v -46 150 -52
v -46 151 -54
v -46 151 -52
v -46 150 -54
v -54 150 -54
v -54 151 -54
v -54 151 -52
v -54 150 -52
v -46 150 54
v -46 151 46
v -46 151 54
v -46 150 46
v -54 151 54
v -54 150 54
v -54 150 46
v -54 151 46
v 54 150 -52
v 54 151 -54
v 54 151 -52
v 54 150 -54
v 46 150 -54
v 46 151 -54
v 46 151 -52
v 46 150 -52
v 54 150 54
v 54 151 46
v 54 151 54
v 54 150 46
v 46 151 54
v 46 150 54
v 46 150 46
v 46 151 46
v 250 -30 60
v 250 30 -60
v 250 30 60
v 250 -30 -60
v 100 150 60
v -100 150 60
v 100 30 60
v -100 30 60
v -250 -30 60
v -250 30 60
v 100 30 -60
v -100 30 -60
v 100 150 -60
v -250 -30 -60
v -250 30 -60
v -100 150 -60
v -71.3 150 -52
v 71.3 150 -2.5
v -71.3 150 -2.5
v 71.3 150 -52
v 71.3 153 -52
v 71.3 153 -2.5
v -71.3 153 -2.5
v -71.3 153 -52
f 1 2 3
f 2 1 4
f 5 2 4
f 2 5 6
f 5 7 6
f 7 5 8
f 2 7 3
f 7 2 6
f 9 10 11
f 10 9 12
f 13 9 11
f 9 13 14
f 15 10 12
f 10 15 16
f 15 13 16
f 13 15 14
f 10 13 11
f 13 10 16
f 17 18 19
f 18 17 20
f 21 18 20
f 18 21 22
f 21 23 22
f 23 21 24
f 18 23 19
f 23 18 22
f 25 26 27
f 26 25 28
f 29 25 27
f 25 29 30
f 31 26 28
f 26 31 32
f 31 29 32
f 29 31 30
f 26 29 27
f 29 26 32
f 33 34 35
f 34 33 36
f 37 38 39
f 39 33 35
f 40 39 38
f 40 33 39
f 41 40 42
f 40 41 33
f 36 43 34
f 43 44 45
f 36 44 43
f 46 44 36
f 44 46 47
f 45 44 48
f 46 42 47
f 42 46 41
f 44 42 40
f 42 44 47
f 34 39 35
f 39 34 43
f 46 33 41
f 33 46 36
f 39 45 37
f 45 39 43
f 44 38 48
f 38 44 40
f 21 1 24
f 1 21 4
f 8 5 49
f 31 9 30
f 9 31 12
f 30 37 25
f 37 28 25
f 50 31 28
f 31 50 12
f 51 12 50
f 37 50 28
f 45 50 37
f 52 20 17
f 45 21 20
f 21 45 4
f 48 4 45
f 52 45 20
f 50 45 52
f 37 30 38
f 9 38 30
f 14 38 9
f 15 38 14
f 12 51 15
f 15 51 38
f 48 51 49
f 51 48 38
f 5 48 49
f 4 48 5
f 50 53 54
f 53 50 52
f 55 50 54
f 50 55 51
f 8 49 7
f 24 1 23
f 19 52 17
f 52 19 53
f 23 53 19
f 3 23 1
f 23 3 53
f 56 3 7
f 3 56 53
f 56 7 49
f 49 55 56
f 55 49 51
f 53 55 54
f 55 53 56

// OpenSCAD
// file: lume-config-bolt.scad
// LUME v2 — Bolt SKU configuration overrides.
//
// This file is INCLUDED INSTEAD OF lume-config.scad for the Bolt-bar build
// path. It defines every constant needed by lume-shell.scad / lume-pod.scad
// at Bolt-SKU values. To regenerate Bolt-bar STLs, set the OpenSCAD
// command-line `-D BOLT_SKU=true` and use lume-tform-bolt-assembly.scad as
// the entrypoint, OR pass per-variable `-D` overrides matching the values
// below.
//
// Rule: if a constant matters for the bar's external shape, the cradle, or
// the pod's K11 housing, override it here. Everything else (joinery, ribbing,
// LED, wordmark, render quality, feature toggles) inherits the v1 defaults
// from lume-config.scad which we're not redefining.
//
// ── 2026-04-27 caliper-verify checklist (when the Bolt arrives) ──
//   [ ] FEMTO_W              measured along the bar X-axis. Target 140 ±0.5.
//   [ ] FEMTO_D              measured along bar Y-axis (front-to-back). Target 39.
//   [ ] FEMTO_H              measured along bar Z-axis (top-to-bottom). Target 30.
//   [ ] FEMTO_MOUNT_PITCH_X  M3 mount-hole spacing along X. Currently 100, TBD.
//   [ ] FEMTO_MOUNT_PITCH_Z  M3 mount-hole spacing along Z. Currently 30, TBD.
//   [ ] USB-C port angle     side-exit vs rear-exit drives umbilical routing.
//   [ ] Tripod bushing       1/4-20 / M4 / nothing? affects optional cradle pin.
//   [ ] Mass with cable      drives torque rating on cradle clamp.
//   [ ] Lens recess depth    nudge CAM_RECESS_DEPTH if lens proud of pill window.
// After verification, re-export STLs:
//   openscad -D BOLT_SKU=true -o exports/sku1-bolt/<part>.stl <part>-source.scad
// then re-render hero shots via render_tform.py --variant bolt.

// ======== EXTERIOR (Bolt overrides) ========
LUME_WIDTH   = 500;     // UNCHANGED — same bar width as Mega SKU
LUME_HEIGHT  = 120;     // UNCHANGED — same bar height
LUME_DEPTH   = 60;      // ⭐ OVERRIDE: was 85. Bolt is 39mm deep, doesn't need 85
                        //   internal cavity becomes 60-6 = 54mm front-to-back
WALL         = 3.0;     // UNCHANGED
CORNER_R     = 8;       // UNCHANGED
INNER_R      = 5;       // UNCHANGED
CHAMFER      = 1.2;     // UNCHANGED

// ======== SPLIT PLANE ========
SPLIT_Y      = 0;       // UNCHANGED — centered split
SPLIT_X      = 80;      // UNCHANGED — keep seam-hide position from v1 fix
SPLIT_SHELL_X = true;
LIP_W        = 2.0;
LIP_H        = 3.0;
LIP_CLEAR    = 0.2;

// ======== COMPONENT FOOTPRINTS (Bolt camera) ========
JETSON_W = 110; JETSON_D = 110; JETSON_H = 72;   // legacy compat — unused in Bolt
JETSON_MOUNT_PITCH = 96;
FEMTO_W  = 140;         // ⭐ OVERRIDE: Bolt is 140mm wide along bar X-axis
FEMTO_D  = 39;          // ⭐ OVERRIDE: Bolt is 39mm deep
FEMTO_H  = 30;          // ⭐ OVERRIDE: Bolt is 30mm tall
FEMTO_MOUNT_PITCH_X = 100;  // ⚠ TBD — verify with caliper on Apr 27
FEMTO_MOUNT_PITCH_Z = 30;   // ⚠ TBD — verify with caliper on Apr 27

// ======== WORDMARK (Bolt SKU) ========
WORDMARK_TEXT  = "LUME";
WORDMARK_H     = 16;
WORDMARK_DEPTH = 1.5;
WORDMARK_Z     = 18;
MIRROR_WORDMARK = false;

// ======== LED diffuser (Bolt SKU — same) ========
LED_W = 460;
LED_H = 6;
LED_Z = -32;
LED_X = 0;
LED_DEPTH = 4;
LED_ID = 8;

// ======== Camera recesses ========
CAM_RECESS_DEPTH = 4;

// ======== End grilles ========
SHOW_END_GRILLES = false;
GRILLE_W = 60;
GRILLE_H = 30;
GRILLE_X_OFFSET = LUME_WIDTH/2 - GRILLE_W/2 - 22;

// ======== VESA on bar rear (Bolt SKU keeps as fallback) ========
VESA_PITCH = 100;
VESA_HOLE_D = 5.4;
VESA_PLATE_T = 4;

// ======== JOINERY ========
INSERT_OD = 4.5;
INSERT_DEPTH = 6;
INSERT_PITCH = 100;
COUNTERBORE_D = 6.0;
CORNER_BOLT_INSET = 14;

// ======== INTERNAL STRUCTURE ========
RIB_T = 2.0;
RIB_H = 8;
RIB_PITCH = 80;
CABLE_CHANNEL_W = 10;
CABLE_CHANNEL_H = 6;
BAFFLE_T = 2.5;
BAFFLE_X = -LUME_WIDTH/2 + 180;

// ======== T-FORM REAR POD (Bolt SKU — slimmer) ========
POD_ENABLED  = true;
// ⭐ VERIFIED K11 spec B0G12MD8RD (2026-04-26).
K11_W  = 131.83;     // was 142.6
K11_D  = 124.46;     // was 113 — drives POD_D bump
K11_H  =  57.91;     // was 49.5
K11_VESA_PITCH = 75;
K11_BOTTOM_FAN_INTAKE = true;
K11_TOP_FAN_EXHAUST   = true;
K11_BOTTOM_CLEAR_MIN  = 12;

POD_W        = 200;     // UNCHANGED
POD_H        = 130;     // ⭐ OVERRIDE: bar height + K11 fan-intake clearance
POD_D        = 165;     // ⭐ OVERRIDE — was 100 (and 130 in Mega config).
                        //   Verified K11_D = 124.5mm + 25 cable-bend + 10 airflow
                        //   rear gap = 159mm internal cavity needed → POD_D=165.
                        //   Bolt SKU has no Mega Jetson hump but still needs
                        //   space for the K11 itself — same constraint as Mega.
POD_X_OFF    = 0;
POD_WALL     = WALL;
POD_FILLET_R = 8;       // ⭐ OVERRIDE: was 12. Tighter visual line on slim bar.

POD_FLANGE_T   = 4;
POD_FLANGE_W   = 12;
POD_BOLT_INSET = 8;

POD_VESA_PITCH = 100;
POD_VESA_PLATE_T = VESA_PLATE_T;

POD_VENT_W = 40;
POD_VENT_H = 4;
POD_VENT_PITCH = 10;
POD_VENT_COUNT = 6;

POD_FEEDTHROUGH_W = 80;
POD_FEEDTHROUGH_H = 24;

// ======== RENDER QUALITY ========
$fa = 2;
$fs = 0.4;

// ======== FEATURE TOGGLES ========
SHOW_COMPONENTS = true;
SHOW_INTERNALS  = true;
EXPLODED        = false;
EXPLODE_DIST    = 60;
USE_JOINERY     = false;

USE_REAL_FEMTO = false;     // Bolt STEP not yet imported. Cube proxy for now.
USE_REAL_BOLT  = false;     // ⚠ flip to true once references/orbbec-femto-bolt.stl lands
// main file
// LUME T-form concept — bar + rear pod
// 2026-04-26 — proposal: separate compute pod behind the bar so the bar keeps
// its slim Sonos profile and the K11 + Mega + cables get a proper volume.
//
// Render: openscad -o lume-pod-concept.stl lume-pod-concept.scad
// Or load in OpenSCAD GUI for live preview.

include <lume-config-bolt.scad>;

// --- Pod parameters (all editable here) ---
POD_W       = 200;   // pod width along bar X-axis
POD_H       = LUME_HEIGHT;  // match bar height for a clean side silhouette
POD_D       = 120;   // pod depth along bar Y-axis (extension behind bar)
POD_X_OFF   = 0;     // 0 = centered, negative = shift left
POD_VESA_PITCH = 100;  // VESA 100×100 on back of pod

// Whether to fillet the pod-bar transition for visual continuity.
POD_FILLET  = true;
POD_FILLET_R = 12;

// --- Front bar (current LUME shell) ---
module front_bar() {
    // Use a simple cube proxy — real bar is the existing shell halves
    color("#222831", 0.9)
    translate([-LUME_WIDTH/2, -LUME_DEPTH/2, -LUME_HEIGHT/2])
        cube([LUME_WIDTH, LUME_DEPTH, LUME_HEIGHT]);
}

// --- Rear pod (new compute enclosure) ---
module rear_pod() {
    color("#1a2027", 0.95)
    translate([POD_X_OFF - POD_W/2, LUME_DEPTH/2, -POD_H/2])
        cube([POD_W, POD_D, POD_H]);
}

// Optional fillet between bar back face and pod front face — gives the
// transition a soft chamfer instead of a hard 90° step.
module fillet_strip() {
    if (POD_FILLET) {
        color("#3a4252", 0.85)
        translate([POD_X_OFF - POD_W/2, LUME_DEPTH/2 - POD_FILLET_R/2,
                   -POD_H/2])
            // Triangular chamfer prism running the pod width.
            rotate([0, 0, 0])
                linear_extrude(height=POD_H)
                    polygon(points=[[0, 0],
                                    [POD_W, 0],
                                    [POD_W, POD_FILLET_R],
                                    [0, POD_FILLET_R]]);
    }
}

// --- Internal callouts (visualisation) ---
module k11_proxy() {
    // K11 published spec: 142.6 × 113 × 49.5mm — landscape flat
    K11_W = 142.6; K11_D = 113; K11_H = 49.5;
    color("#5a8a5a", 0.85)
    translate([POD_X_OFF - K11_W/2,
               LUME_DEPTH/2 + 10,                  // 10mm clearance from bar back
               -POD_H/2 + 8])                      // 8mm off pod floor for airflow
        cube([K11_W, K11_D, K11_H]);
}

module femto_proxy() {
    // Femto Mega: 127×65×38 with rear Jetson hump (extra 25mm in -Y direction)
    // Mounted in FRONT half of bar; hump extends back into pod.
    FM_W = 127; FM_D = 65; FM_H = 38;
    HUMP_D = 25;
    color("#a08020", 0.9)
    union() {
        // Main body in front bar
        translate([-FM_W/2, -LUME_DEPTH/2 + 3, -FM_H/2])
            cube([FM_W, FM_D, FM_H]);
        // Rear Jetson hump extending into pod
        translate([-FM_W/2 + 20, FM_D/2 - LUME_DEPTH/2 + 3, -FM_H/2 + 10])
            cube([FM_W - 40, HUMP_D, FM_H - 20]);
    }
}

module vesa_pad() {
    // VESA 100×100 mount pads on REAR face of pod (against wall)
    color("#888", 0.9)
    for (x = [-POD_VESA_PITCH/2, POD_VESA_PITCH/2],
         z = [-POD_VESA_PITCH/2, POD_VESA_PITCH/2]) {
        translate([POD_X_OFF + x - 4, LUME_DEPTH/2 + POD_D - 1, z - 4])
            cube([8, 2, 8]);
    }
}

// --- Assembly ---
module lume_t_form() {
    front_bar();
    rear_pod();
    fillet_strip();
    k11_proxy();
    femto_proxy();
    vesa_pad();
}

lume_t_form();
